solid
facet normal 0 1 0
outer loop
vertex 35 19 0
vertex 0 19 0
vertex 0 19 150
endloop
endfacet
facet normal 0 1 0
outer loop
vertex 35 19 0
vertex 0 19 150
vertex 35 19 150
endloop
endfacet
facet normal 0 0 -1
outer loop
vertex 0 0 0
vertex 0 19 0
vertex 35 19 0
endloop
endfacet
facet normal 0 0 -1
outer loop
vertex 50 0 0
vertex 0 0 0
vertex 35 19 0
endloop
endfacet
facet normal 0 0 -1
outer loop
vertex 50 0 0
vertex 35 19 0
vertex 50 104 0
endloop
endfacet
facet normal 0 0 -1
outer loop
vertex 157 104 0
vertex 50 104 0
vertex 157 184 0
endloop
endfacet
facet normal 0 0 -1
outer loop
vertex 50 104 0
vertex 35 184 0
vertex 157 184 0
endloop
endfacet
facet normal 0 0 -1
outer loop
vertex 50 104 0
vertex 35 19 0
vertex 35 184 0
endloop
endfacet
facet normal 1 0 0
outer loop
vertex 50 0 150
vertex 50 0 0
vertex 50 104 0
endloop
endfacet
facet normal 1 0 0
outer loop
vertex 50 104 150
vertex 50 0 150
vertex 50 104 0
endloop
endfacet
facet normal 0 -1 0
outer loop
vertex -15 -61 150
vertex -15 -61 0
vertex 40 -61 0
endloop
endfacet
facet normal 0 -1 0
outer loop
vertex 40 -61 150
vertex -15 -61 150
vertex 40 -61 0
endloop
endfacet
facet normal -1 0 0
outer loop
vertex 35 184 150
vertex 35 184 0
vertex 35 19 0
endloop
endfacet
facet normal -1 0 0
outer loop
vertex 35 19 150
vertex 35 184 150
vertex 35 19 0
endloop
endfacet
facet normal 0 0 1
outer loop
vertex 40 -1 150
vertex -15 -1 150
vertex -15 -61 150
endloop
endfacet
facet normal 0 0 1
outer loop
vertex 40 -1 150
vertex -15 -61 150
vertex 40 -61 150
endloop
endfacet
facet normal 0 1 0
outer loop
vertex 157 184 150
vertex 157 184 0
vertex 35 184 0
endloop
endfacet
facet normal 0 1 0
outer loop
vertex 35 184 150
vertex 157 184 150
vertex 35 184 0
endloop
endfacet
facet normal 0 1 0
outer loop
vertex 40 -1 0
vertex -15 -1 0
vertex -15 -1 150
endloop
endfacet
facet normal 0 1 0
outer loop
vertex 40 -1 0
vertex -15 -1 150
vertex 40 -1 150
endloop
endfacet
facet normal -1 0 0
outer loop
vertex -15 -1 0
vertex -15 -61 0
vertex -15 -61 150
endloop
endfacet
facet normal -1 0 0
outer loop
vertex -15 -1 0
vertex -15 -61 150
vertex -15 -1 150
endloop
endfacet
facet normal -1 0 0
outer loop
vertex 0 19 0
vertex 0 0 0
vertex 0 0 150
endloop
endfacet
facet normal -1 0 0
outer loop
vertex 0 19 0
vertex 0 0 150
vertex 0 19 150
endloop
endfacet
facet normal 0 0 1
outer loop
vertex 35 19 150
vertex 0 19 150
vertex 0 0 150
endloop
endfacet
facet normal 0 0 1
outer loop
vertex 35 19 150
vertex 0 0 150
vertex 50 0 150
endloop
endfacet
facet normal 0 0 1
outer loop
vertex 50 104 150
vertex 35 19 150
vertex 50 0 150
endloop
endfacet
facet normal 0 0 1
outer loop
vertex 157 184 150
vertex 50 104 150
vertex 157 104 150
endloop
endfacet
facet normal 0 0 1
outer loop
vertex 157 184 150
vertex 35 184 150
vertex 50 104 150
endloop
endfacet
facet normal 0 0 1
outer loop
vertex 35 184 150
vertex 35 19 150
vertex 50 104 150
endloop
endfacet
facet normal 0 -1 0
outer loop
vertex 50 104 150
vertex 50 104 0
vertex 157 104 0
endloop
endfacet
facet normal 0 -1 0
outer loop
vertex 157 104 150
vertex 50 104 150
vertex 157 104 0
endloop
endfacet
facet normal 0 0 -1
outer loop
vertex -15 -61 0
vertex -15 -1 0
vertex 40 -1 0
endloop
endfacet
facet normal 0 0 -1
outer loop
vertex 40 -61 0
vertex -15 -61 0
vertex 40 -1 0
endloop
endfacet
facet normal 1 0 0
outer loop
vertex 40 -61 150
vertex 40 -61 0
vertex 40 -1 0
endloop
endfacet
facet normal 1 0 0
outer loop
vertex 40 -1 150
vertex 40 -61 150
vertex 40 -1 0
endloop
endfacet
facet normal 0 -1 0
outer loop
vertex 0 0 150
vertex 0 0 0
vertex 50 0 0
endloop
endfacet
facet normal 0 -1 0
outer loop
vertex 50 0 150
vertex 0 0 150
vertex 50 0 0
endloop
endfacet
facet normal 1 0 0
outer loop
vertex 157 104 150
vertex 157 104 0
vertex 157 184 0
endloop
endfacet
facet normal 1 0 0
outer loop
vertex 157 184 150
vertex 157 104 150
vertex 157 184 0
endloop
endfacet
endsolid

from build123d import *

# Parameters (mm, degrees)
SKETCH1_W           = 50
SKETCH1_H           = 19
SKETCH1_W_2         = 107
SKETCH1_H_2         = 80
SKETCH1_W_3         = 55
SKETCH1_H_3         = 60
BOSS_EXTRUDE1_DEPTH = 150


with BuildPart() as part:
    # Sketch1 → Boss-Extrude1 (new body)
    with BuildSketch(Plane.XY):
        with Locations((25, 9.5)):
            Rectangle(SKETCH1_W, SKETCH1_H)
        Polygon((50, 104), (50, 184), (35, 184), (35, 19), (50, 19), align=None)
        with Locations((103.5, 144)):
            Rectangle(SKETCH1_W_2, SKETCH1_H_2)
        with Locations((12.5, -31)):
            Rectangle(SKETCH1_W_3, SKETCH1_H_3)
    extrude(amount=BOSS_EXTRUDE1_DEPTH)


solid = part.part
